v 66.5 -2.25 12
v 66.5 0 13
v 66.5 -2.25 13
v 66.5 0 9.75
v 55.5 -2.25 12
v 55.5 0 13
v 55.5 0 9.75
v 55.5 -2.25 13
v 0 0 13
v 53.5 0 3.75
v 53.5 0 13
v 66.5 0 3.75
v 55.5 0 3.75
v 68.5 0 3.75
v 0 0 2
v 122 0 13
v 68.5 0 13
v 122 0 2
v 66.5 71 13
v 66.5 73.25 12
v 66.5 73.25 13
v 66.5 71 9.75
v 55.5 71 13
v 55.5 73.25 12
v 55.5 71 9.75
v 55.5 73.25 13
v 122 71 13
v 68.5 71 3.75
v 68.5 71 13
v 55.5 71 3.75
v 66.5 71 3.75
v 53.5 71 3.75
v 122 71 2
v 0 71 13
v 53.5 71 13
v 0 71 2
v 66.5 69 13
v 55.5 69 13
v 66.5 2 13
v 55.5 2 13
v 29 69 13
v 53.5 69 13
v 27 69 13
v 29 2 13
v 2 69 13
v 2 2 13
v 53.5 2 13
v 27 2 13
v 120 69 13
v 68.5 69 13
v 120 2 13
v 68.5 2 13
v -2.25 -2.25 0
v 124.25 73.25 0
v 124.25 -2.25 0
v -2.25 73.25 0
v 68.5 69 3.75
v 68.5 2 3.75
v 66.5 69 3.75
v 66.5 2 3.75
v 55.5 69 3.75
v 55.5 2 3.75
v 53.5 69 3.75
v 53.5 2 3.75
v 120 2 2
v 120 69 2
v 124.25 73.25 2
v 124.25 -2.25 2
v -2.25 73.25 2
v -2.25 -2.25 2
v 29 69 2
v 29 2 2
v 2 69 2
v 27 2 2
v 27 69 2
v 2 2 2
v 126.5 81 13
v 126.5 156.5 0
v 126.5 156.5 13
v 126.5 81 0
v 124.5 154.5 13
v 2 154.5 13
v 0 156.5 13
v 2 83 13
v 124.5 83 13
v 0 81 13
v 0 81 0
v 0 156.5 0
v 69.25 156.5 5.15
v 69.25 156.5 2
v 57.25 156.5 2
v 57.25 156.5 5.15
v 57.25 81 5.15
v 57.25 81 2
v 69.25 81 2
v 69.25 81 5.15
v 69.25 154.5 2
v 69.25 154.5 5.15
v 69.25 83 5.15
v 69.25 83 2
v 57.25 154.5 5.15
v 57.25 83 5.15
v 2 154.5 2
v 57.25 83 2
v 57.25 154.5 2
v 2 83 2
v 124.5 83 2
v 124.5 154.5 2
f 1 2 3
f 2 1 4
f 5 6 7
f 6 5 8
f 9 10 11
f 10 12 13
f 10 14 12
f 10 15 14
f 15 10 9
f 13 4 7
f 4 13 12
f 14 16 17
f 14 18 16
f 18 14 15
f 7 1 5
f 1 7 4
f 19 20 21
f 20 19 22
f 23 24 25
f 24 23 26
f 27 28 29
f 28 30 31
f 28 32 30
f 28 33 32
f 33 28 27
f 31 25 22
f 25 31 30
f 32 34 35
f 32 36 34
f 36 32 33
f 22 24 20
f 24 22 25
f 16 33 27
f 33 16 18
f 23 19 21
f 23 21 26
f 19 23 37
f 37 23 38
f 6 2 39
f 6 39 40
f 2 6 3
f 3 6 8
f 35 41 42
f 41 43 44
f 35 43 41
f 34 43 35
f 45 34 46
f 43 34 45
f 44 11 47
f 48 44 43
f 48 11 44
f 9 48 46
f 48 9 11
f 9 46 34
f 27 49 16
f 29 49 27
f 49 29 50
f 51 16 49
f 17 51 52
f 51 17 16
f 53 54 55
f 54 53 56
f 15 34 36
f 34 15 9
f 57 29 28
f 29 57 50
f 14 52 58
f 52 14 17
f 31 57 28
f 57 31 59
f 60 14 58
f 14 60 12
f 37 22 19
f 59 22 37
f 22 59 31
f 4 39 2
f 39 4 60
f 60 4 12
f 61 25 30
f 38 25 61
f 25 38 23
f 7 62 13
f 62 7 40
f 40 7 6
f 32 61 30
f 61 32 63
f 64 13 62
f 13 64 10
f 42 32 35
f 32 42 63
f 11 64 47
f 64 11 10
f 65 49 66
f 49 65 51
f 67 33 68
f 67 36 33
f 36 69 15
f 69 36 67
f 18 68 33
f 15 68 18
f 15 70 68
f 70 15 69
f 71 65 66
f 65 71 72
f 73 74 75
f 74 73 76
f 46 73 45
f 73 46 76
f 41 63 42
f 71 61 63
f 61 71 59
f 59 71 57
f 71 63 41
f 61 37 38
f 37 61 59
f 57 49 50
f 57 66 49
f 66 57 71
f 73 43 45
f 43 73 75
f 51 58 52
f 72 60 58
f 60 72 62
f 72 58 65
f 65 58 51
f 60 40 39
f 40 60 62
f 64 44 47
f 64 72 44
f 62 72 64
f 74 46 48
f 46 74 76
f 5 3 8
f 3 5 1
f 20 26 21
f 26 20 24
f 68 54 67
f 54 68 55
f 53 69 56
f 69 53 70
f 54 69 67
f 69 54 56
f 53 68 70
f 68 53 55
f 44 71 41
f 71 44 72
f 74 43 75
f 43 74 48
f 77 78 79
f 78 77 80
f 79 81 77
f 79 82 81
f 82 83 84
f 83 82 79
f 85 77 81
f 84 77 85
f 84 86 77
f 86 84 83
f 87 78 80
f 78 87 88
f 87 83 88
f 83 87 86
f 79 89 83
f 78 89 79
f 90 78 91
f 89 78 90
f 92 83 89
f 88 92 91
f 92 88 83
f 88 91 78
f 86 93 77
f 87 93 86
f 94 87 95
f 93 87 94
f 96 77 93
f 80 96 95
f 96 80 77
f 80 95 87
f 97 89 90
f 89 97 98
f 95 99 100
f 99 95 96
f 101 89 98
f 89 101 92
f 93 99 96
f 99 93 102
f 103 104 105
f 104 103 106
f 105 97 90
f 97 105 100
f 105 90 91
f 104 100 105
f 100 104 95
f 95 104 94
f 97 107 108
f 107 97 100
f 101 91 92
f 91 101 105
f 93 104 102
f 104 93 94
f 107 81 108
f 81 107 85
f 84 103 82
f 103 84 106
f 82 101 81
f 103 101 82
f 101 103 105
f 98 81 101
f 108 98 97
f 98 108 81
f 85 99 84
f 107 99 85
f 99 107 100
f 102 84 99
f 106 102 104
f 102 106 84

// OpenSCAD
part = "both"; //[top:Top, bottom:Bottom, both:Both]

CARD_SIZE_LONG_EDGE = 91;
CARD_SIZE_SHORT_EDGE = 67;
CARD_STACK_HEIGHT = 11;
WALL_THICKNESS = 2;
TAB_THICKNESS = 11;
EXTRA_SPACE = .25;
DIVIDER_SPACE = 25;
DIVIDER_HEIGHT = 11;
DIVIDER_THICKNESS = 2;

CARD_LONG_EDGE = CARD_SIZE_LONG_EDGE + (WALL_THICKNESS*2) + DIVIDER_SPACE + DIVIDER_THICKNESS;
CARD_SHORT_EDGE = CARD_SIZE_SHORT_EDGE + (WALL_THICKNESS*2);
ALL_EXTRA_SPACE = (EXTRA_SPACE *2);

LID_OUTSIDE_LONG_THICKNESS = CARD_LONG_EDGE + (WALL_THICKNESS*2);
LID_OUTSIDE_SHORT_THICKNESS = CARD_SHORT_EDGE + (WALL_THICKNESS*2);

SPACE_BETWEEN_BOTTOM_AND_LID = LID_OUTSIDE_SHORT_THICKNESS + (WALL_THICKNESS*2)+ 2;

HEIGHT = CARD_STACK_HEIGHT + WALL_THICKNESS;

module print_top()
{
  //*Start Top of Box
     
        difference() 
        {
            cube ([LID_OUTSIDE_LONG_THICKNESS+ALL_EXTRA_SPACE, LID_OUTSIDE_SHORT_THICKNESS+ALL_EXTRA_SPACE, HEIGHT]); 		//*Top Main Body


            translate([ ((LID_OUTSIDE_LONG_THICKNESS+ALL_EXTRA_SPACE) / 2)-((TAB_THICKNESS+1)/2), -.5, WALL_THICKNESS]) 
        cube ([(TAB_THICKNESS+1), LID_OUTSIDE_SHORT_THICKNESS + 2, WALL_THICKNESS+1.15 ]); 	//*Tab Hole

            translate([WALL_THICKNESS,WALL_THICKNESS, WALL_THICKNESS]) 
        cube ([LID_OUTSIDE_LONG_THICKNESS - (WALL_THICKNESS*2)+ALL_EXTRA_SPACE,LID_OUTSIDE_SHORT_THICKNESS - (WALL_THICKNESS*2)+ALL_EXTRA_SPACE,HEIGHT]);		//*Hole
        }
    //* End Top of Box  
}

module print_bottom()
{
    //*Start Bottom of Box

					//*Start wedge 1
translate ([((CARD_LONG_EDGE/2) -(TAB_THICKNESS/2)),-WALL_THICKNESS-EXTRA_SPACE,HEIGHT-WALL_THICKNESS-1-EXTRA_SPACE]) 

difference (){
cube ([TAB_THICKNESS,WALL_THICKNESS+EXTRA_SPACE,WALL_THICKNESS+EXTRA_SPACE]);
translate ([0, WALL_THICKNESS+(EXTRA_SPACE),0]) rotate ([135,0,0])  

cube ([(TAB_THICKNESS+3), sqrt(((WALL_THICKNESS+EXTRA_SPACE)*(WALL_THICKNESS+EXTRA_SPACE))+((WALL_THICKNESS+EXTRA_SPACE)*(WALL_THICKNESS+EXTRA_SPACE))), sqrt(((WALL_THICKNESS+EXTRA_SPACE)*(WALL_THICKNESS+EXTRA_SPACE))+((WALL_THICKNESS+EXTRA_SPACE)*(WALL_THICKNESS+EXTRA_SPACE)))]);

}
			//*end wedge 1


			//*Start wedge 2
translate ([((CARD_LONG_EDGE/2) - (TAB_THICKNESS/2)),CARD_SHORT_EDGE,HEIGHT-WALL_THICKNESS-1-EXTRA_SPACE])

 difference (){
cube ([TAB_THICKNESS,WALL_THICKNESS+EXTRA_SPACE,WALL_THICKNESS+EXTRA_SPACE]);

translate ([0 ,0 ,0]) rotate ([-45,0,0])  cube ([(TAB_THICKNESS+3),sqrt(((WALL_THICKNESS+EXTRA_SPACE)*(WALL_THICKNESS+EXTRA_SPACE))+((WALL_THICKNESS+EXTRA_SPACE)*(WALL_THICKNESS+EXTRA_SPACE))),sqrt(((WALL_THICKNESS+EXTRA_SPACE)*(WALL_THICKNESS+EXTRA_SPACE))+((WALL_THICKNESS+EXTRA_SPACE)*(WALL_THICKNESS+EXTRA_SPACE)))]);
}
			//*end wedge 2


translate ([((CARD_LONG_EDGE/2) -(TAB_THICKNESS/2)),-WALL_THICKNESS-EXTRA_SPACE,HEIGHT-1])  cube ([TAB_THICKNESS, WALL_THICKNESS+EXTRA_SPACE, 1]); 					//*Tab

translate ([((CARD_LONG_EDGE/2) -(TAB_THICKNESS/2)),CARD_SHORT_EDGE,HEIGHT-1])  cube ([TAB_THICKNESS, WALL_THICKNESS+EXTRA_SPACE, 1]);				//*Tab

translate ([-WALL_THICKNESS-EXTRA_SPACE, -WALL_THICKNESS-EXTRA_SPACE, 0 ]) cube ([CARD_LONG_EDGE + (WALL_THICKNESS*2)+ALL_EXTRA_SPACE, CARD_SHORT_EDGE + (WALL_THICKNESS*2)+ALL_EXTRA_SPACE, WALL_THICKNESS]);  						//*Bottom Plate

difference() 
{
	cube ([CARD_LONG_EDGE,CARD_SHORT_EDGE,HEIGHT]);		//*Main Body

	translate([ ((CARD_LONG_EDGE / 2) + (TAB_THICKNESS/2)), -.5, ((HEIGHT+ WALL_THICKNESS) / 4) ]) cube ([2, CARD_SHORT_EDGE + 2, HEIGHT]);	//*Tab cutout
	
	translate([ ((CARD_LONG_EDGE / 2) - ((TAB_THICKNESS/2)+2)), -.5, ((HEIGHT+ WALL_THICKNESS)/ 4) ]) cube ([2, CARD_SHORT_EDGE + 2, HEIGHT ]);  //*Tab cutout

	translate([WALL_THICKNESS,WALL_THICKNESS,WALL_THICKNESS]) cube ([CARD_LONG_EDGE - (WALL_THICKNESS*2),CARD_SHORT_EDGE - (WALL_THICKNESS*2),HEIGHT]);			//*Hole
}

translate([WALL_THICKNESS + DIVIDER_SPACE + DIVIDER_THICKNESS/2, CARD_SHORT_EDGE/2 , DIVIDER_HEIGHT/2 + WALL_THICKNESS])
    cube([DIVIDER_THICKNESS, CARD_SHORT_EDGE - WALL_THICKNESS*2 + .01,  DIVIDER_HEIGHT], center = true);

			//*End Bottom of Box
}

module print_part()
{
    if(part == "bottom")
    {
        print_bottom();
    }
    else if(part == "top")
    {
        print_top();
    }
    else
    {
        print_bottom();
        translate ([0, SPACE_BETWEEN_BOTTOM_AND_LID, 0])
            print_top();
    }
}

print_part();
